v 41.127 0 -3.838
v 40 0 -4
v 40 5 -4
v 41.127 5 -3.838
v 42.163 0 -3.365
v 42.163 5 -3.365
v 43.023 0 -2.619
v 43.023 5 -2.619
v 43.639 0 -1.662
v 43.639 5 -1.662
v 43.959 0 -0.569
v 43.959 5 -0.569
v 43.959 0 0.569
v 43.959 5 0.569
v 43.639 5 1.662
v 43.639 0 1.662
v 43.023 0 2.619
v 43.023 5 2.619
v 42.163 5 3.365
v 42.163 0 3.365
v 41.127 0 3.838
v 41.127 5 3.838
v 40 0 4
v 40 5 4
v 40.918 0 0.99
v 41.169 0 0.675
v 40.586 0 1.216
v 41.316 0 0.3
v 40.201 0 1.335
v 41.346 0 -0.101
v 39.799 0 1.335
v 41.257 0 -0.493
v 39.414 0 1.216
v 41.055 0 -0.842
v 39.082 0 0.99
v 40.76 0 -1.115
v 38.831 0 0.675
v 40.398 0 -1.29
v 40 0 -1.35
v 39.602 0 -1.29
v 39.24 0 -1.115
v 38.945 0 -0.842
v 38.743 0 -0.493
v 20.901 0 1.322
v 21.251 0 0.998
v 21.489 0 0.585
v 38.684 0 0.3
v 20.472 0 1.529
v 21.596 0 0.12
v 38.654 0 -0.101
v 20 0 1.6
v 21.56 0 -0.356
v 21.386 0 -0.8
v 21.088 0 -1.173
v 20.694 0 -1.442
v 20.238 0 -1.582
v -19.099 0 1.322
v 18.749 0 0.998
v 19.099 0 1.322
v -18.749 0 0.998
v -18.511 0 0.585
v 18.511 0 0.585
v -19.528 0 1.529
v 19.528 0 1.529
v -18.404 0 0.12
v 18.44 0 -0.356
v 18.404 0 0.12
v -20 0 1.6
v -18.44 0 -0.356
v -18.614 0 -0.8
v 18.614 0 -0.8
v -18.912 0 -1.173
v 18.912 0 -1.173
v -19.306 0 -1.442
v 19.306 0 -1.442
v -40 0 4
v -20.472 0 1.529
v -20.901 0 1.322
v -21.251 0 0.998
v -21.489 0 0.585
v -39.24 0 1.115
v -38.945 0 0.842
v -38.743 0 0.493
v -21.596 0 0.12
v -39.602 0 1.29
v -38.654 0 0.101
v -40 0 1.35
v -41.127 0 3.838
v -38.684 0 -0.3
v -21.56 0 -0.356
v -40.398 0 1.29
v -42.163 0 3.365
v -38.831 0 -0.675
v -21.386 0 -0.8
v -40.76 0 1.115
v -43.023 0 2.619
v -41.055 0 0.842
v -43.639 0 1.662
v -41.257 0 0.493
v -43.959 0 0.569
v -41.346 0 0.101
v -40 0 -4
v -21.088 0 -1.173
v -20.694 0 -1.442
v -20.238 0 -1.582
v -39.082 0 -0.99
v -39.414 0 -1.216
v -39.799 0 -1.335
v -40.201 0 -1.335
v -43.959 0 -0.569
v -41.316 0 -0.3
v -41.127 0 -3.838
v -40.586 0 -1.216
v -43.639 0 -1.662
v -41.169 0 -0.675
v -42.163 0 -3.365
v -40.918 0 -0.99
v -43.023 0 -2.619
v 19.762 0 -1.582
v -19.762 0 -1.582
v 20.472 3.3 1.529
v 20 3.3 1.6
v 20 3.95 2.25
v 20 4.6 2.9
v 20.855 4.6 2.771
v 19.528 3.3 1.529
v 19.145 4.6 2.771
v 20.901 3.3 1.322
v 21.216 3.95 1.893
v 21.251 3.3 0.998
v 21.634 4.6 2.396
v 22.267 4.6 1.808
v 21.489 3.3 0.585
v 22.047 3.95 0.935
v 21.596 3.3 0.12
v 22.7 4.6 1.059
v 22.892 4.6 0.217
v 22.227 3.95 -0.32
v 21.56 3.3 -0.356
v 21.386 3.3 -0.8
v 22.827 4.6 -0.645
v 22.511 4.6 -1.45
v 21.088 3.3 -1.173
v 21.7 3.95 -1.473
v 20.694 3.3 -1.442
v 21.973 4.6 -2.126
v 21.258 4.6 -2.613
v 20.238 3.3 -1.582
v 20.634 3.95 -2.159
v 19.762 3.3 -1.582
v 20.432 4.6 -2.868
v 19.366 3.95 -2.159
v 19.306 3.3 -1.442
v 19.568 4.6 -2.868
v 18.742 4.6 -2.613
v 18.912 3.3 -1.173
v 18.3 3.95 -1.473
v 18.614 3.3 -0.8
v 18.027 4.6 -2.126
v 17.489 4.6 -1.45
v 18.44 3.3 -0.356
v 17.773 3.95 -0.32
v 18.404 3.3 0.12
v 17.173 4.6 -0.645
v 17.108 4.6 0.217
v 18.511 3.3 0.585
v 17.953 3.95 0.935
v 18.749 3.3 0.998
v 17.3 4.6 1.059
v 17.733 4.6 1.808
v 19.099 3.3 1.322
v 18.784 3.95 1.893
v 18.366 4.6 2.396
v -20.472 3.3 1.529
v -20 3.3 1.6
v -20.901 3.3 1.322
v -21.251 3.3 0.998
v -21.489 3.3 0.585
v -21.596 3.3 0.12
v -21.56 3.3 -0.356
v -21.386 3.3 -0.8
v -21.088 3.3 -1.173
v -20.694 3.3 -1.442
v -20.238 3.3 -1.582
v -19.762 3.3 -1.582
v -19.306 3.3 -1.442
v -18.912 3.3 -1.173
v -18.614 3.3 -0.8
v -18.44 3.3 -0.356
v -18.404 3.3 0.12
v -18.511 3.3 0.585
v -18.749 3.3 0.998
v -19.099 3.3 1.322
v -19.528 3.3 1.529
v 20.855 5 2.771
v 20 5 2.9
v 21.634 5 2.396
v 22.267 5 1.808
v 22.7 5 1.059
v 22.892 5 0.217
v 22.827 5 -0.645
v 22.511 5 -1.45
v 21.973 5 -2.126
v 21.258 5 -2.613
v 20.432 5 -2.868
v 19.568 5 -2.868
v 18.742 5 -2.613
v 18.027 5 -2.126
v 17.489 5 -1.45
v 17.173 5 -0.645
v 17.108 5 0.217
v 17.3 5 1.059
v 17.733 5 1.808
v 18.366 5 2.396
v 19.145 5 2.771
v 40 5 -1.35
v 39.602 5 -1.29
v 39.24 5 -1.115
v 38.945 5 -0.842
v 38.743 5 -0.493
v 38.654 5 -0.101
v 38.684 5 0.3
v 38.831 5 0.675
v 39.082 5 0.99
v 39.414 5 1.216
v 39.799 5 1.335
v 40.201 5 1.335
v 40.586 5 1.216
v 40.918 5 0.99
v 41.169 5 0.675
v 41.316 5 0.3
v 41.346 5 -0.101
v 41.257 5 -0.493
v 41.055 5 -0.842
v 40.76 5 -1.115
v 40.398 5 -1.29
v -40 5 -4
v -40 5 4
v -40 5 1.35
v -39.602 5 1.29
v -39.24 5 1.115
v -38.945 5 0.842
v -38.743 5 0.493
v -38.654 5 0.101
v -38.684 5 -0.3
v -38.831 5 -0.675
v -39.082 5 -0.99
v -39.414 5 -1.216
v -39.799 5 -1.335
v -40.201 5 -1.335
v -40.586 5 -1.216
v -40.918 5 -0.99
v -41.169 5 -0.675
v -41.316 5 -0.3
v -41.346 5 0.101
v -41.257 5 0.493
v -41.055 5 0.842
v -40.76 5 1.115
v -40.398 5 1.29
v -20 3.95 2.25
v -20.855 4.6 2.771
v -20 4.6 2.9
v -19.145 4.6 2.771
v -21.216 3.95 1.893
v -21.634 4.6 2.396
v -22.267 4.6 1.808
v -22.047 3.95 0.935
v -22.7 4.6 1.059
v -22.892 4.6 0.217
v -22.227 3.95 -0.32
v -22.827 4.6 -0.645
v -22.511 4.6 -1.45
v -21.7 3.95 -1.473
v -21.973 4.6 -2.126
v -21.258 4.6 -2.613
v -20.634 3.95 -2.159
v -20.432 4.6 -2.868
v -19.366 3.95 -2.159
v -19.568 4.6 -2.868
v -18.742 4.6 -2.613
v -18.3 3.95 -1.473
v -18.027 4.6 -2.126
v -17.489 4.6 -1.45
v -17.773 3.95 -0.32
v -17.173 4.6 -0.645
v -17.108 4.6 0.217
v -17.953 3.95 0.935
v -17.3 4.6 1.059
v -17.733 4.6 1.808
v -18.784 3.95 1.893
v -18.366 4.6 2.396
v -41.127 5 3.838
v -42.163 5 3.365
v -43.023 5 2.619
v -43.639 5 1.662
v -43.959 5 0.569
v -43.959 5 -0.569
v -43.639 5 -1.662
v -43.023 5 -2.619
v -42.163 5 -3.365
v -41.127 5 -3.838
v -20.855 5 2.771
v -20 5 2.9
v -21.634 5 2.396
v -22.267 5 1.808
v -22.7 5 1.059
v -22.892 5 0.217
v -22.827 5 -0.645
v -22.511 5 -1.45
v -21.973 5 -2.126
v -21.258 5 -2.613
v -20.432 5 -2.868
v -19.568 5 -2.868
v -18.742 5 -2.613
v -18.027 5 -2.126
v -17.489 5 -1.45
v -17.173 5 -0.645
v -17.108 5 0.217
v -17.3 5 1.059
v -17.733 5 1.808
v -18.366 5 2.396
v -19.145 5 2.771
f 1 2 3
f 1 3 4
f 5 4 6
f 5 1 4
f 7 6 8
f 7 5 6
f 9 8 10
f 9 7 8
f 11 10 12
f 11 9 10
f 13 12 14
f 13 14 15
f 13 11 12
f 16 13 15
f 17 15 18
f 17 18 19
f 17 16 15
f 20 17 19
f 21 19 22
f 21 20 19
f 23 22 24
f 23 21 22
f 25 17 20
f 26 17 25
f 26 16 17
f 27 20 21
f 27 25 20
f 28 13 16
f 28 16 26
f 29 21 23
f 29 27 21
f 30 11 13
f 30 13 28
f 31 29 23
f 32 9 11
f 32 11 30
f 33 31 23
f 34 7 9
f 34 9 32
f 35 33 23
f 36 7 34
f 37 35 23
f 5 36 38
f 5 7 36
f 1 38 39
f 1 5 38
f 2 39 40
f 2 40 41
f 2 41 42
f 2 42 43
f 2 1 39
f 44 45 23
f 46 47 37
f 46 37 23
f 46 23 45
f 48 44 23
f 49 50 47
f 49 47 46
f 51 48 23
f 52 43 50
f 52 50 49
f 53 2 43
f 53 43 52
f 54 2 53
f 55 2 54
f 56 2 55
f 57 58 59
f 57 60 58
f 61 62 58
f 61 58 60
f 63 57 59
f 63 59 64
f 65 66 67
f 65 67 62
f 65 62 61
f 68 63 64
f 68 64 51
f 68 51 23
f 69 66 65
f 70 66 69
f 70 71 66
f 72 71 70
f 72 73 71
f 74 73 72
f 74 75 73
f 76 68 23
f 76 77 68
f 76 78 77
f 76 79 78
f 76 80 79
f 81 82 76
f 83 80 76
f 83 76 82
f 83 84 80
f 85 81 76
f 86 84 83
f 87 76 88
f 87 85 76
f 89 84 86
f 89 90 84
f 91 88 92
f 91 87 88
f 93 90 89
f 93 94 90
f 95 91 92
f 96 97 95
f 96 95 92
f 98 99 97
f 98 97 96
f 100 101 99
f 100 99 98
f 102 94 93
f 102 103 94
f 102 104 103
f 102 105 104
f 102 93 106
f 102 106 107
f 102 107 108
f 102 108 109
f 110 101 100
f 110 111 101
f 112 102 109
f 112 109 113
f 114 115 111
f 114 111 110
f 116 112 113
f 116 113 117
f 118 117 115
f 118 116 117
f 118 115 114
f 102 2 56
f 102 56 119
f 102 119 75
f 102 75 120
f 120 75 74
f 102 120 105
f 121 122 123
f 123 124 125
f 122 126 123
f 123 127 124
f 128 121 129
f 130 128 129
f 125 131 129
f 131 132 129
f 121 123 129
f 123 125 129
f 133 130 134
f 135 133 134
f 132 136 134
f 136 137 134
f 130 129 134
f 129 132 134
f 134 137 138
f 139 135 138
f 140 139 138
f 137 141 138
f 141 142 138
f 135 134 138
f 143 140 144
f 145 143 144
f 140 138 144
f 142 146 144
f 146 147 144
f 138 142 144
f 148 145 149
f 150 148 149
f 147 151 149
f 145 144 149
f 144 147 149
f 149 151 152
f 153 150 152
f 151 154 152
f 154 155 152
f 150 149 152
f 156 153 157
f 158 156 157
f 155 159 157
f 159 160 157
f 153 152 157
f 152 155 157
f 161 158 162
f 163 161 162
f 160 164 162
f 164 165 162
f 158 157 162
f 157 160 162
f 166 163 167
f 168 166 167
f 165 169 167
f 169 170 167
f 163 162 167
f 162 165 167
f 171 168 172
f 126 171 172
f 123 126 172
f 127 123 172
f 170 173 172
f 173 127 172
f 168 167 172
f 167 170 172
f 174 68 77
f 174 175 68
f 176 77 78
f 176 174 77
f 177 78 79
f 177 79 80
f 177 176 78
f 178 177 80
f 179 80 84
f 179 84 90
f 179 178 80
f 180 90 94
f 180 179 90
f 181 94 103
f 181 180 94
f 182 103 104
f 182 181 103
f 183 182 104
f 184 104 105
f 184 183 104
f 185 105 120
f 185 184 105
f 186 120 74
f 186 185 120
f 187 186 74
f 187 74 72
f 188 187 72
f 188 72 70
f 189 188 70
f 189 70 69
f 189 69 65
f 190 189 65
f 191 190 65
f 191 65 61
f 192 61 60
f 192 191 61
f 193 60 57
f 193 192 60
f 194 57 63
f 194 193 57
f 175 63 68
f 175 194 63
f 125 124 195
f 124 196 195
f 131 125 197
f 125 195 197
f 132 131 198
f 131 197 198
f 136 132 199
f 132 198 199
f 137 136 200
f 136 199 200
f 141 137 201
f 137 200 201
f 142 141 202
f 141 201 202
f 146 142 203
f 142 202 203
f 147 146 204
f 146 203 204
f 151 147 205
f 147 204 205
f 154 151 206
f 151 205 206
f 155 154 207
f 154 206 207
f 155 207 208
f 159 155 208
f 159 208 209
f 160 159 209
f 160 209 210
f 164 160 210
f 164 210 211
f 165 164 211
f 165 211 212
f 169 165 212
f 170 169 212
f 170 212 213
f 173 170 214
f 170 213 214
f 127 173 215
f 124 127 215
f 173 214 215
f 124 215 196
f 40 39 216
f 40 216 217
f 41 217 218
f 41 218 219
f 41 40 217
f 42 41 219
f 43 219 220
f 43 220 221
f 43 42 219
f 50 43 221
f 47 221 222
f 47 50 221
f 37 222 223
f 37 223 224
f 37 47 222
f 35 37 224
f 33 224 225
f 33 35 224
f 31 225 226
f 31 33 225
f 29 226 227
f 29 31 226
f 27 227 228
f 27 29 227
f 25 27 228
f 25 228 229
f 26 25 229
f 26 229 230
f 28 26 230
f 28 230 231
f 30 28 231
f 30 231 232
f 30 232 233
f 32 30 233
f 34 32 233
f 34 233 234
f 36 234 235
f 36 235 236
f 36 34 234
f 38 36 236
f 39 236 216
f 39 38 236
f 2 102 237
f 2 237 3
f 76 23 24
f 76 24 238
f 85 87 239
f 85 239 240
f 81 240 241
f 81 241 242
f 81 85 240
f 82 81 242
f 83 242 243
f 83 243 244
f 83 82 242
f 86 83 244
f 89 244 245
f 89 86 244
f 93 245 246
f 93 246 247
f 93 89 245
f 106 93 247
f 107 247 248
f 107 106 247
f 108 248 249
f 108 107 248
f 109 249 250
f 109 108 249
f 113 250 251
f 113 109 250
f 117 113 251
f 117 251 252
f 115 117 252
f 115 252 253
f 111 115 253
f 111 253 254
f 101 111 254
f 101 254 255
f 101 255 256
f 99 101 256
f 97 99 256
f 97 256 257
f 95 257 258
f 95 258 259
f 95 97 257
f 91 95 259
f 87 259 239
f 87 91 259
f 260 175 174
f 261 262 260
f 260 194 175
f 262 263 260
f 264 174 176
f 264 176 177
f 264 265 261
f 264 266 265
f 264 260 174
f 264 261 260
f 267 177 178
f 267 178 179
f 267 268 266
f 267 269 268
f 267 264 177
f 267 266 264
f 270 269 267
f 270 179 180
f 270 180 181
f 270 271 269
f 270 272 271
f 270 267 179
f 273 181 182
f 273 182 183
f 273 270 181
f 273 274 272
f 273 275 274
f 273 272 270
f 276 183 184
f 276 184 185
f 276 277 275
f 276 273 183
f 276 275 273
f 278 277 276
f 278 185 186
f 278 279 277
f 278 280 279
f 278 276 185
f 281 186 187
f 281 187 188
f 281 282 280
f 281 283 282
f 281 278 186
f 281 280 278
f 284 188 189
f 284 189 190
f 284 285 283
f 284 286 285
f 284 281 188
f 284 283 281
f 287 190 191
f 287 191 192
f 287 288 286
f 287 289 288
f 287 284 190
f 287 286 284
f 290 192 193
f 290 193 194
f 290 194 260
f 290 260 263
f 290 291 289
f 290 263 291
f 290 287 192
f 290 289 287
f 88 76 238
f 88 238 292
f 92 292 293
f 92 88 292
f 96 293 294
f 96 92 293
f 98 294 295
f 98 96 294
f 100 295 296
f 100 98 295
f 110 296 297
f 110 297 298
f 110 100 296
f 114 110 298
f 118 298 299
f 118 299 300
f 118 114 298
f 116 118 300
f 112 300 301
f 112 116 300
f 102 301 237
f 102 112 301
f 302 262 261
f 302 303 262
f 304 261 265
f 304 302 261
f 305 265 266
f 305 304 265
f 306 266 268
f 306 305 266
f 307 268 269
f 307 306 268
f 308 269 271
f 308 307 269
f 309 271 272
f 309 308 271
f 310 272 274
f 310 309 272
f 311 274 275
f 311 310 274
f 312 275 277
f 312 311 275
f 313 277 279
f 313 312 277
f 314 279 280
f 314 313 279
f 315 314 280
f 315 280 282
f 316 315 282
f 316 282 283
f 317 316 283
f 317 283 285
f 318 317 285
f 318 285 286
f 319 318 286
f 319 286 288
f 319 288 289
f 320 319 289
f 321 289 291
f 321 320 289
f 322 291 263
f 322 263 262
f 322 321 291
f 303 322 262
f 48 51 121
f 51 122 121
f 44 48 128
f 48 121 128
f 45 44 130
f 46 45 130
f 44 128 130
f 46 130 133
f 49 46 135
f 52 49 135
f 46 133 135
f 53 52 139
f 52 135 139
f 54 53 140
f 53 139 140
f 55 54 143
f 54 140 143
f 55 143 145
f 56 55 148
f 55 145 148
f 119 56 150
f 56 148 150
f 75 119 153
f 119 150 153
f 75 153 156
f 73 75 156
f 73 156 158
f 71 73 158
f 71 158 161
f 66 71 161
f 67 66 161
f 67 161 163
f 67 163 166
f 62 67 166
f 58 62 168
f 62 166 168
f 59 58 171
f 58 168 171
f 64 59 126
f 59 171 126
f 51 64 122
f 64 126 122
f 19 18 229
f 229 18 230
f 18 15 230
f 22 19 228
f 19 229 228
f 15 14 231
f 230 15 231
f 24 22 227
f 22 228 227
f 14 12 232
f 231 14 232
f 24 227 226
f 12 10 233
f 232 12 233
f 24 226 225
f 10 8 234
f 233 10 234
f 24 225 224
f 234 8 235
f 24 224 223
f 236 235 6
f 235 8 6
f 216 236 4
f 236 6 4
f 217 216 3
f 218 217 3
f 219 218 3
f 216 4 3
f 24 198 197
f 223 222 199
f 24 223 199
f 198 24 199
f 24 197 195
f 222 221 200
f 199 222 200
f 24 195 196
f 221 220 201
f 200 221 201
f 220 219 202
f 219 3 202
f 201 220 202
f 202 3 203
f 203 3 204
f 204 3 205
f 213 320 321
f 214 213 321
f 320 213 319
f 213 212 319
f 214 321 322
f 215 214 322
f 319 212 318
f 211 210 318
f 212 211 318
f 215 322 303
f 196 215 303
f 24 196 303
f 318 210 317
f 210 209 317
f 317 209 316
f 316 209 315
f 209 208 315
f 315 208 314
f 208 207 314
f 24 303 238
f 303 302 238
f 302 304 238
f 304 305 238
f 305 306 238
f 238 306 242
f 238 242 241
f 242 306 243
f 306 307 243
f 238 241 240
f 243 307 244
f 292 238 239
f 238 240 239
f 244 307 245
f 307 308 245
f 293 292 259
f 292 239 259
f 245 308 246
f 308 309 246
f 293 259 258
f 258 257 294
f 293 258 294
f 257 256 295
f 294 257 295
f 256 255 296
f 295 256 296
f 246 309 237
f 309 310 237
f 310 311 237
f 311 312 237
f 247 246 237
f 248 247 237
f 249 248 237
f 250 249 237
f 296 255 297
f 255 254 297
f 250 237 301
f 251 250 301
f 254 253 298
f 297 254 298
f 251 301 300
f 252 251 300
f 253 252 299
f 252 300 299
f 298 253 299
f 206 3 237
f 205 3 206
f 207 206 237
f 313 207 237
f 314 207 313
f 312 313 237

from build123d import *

# Parameters (mm, degrees)
ESQUISSE1_R        = 1.35
BOSS_EXTRU_1_DEPTH = 5


with BuildPart() as part:
    # Esquisse1 → Boss.-Extru.1 (new body)
    with BuildSketch(Plane(origin=(0, 0, 0), x_dir=(1, 0, 0), z_dir=(0, 1, 0))):
        with BuildLine():
            Line((40, -4), (-40, -4))
            ThreePointArc((-40, -4), (-44, 0), (-40, 4))
            Line((-40, 4), (40, 4))
            ThreePointArc((40, 4), (44, 0), (40, -4))
        make_face()
        with Locations(Location((-40, 0, 0), (0, 0, 270))):
            Circle(ESQUISSE1_R, mode=Mode.SUBTRACT)
        with Locations(Location((40, 0, 0), (0, 0, 90))):
            Circle(ESQUISSE1_R, mode=Mode.SUBTRACT)
    extrude(amount=BOSS_EXTRU_1_DEPTH)

    # Esquisse2 → Fraisage pour vis à tête fraisée M31 (revolve, cut)
    with BuildSketch(Plane(origin=(-20, 5, 0), x_dir=(0, 0, 1), z_dir=(1, 0, 0))):
        Polygon((0, 0), (0, 5), (1.6, 5), (1.6, 1.7), (2.9, 0.4), (2.9, 0), align=None)
    fraisage_pour_vis_t_te_frais_e_m31 = revolve(axis=Axis((-20, 11.35, 0), (0, -1, 0)), mode=Mode.SUBTRACT)

    # Symétrie1: Fraisage pour vis à tête fraisée M31 across plane
    add(fraisage_pour_vis_t_te_frais_e_m31.mirror(Plane(origin=(0, 0, 0), x_dir=(0, 0, 1), z_dir=(1, 0, 0))), mode=Mode.SUBTRACT)


solid = part.part
